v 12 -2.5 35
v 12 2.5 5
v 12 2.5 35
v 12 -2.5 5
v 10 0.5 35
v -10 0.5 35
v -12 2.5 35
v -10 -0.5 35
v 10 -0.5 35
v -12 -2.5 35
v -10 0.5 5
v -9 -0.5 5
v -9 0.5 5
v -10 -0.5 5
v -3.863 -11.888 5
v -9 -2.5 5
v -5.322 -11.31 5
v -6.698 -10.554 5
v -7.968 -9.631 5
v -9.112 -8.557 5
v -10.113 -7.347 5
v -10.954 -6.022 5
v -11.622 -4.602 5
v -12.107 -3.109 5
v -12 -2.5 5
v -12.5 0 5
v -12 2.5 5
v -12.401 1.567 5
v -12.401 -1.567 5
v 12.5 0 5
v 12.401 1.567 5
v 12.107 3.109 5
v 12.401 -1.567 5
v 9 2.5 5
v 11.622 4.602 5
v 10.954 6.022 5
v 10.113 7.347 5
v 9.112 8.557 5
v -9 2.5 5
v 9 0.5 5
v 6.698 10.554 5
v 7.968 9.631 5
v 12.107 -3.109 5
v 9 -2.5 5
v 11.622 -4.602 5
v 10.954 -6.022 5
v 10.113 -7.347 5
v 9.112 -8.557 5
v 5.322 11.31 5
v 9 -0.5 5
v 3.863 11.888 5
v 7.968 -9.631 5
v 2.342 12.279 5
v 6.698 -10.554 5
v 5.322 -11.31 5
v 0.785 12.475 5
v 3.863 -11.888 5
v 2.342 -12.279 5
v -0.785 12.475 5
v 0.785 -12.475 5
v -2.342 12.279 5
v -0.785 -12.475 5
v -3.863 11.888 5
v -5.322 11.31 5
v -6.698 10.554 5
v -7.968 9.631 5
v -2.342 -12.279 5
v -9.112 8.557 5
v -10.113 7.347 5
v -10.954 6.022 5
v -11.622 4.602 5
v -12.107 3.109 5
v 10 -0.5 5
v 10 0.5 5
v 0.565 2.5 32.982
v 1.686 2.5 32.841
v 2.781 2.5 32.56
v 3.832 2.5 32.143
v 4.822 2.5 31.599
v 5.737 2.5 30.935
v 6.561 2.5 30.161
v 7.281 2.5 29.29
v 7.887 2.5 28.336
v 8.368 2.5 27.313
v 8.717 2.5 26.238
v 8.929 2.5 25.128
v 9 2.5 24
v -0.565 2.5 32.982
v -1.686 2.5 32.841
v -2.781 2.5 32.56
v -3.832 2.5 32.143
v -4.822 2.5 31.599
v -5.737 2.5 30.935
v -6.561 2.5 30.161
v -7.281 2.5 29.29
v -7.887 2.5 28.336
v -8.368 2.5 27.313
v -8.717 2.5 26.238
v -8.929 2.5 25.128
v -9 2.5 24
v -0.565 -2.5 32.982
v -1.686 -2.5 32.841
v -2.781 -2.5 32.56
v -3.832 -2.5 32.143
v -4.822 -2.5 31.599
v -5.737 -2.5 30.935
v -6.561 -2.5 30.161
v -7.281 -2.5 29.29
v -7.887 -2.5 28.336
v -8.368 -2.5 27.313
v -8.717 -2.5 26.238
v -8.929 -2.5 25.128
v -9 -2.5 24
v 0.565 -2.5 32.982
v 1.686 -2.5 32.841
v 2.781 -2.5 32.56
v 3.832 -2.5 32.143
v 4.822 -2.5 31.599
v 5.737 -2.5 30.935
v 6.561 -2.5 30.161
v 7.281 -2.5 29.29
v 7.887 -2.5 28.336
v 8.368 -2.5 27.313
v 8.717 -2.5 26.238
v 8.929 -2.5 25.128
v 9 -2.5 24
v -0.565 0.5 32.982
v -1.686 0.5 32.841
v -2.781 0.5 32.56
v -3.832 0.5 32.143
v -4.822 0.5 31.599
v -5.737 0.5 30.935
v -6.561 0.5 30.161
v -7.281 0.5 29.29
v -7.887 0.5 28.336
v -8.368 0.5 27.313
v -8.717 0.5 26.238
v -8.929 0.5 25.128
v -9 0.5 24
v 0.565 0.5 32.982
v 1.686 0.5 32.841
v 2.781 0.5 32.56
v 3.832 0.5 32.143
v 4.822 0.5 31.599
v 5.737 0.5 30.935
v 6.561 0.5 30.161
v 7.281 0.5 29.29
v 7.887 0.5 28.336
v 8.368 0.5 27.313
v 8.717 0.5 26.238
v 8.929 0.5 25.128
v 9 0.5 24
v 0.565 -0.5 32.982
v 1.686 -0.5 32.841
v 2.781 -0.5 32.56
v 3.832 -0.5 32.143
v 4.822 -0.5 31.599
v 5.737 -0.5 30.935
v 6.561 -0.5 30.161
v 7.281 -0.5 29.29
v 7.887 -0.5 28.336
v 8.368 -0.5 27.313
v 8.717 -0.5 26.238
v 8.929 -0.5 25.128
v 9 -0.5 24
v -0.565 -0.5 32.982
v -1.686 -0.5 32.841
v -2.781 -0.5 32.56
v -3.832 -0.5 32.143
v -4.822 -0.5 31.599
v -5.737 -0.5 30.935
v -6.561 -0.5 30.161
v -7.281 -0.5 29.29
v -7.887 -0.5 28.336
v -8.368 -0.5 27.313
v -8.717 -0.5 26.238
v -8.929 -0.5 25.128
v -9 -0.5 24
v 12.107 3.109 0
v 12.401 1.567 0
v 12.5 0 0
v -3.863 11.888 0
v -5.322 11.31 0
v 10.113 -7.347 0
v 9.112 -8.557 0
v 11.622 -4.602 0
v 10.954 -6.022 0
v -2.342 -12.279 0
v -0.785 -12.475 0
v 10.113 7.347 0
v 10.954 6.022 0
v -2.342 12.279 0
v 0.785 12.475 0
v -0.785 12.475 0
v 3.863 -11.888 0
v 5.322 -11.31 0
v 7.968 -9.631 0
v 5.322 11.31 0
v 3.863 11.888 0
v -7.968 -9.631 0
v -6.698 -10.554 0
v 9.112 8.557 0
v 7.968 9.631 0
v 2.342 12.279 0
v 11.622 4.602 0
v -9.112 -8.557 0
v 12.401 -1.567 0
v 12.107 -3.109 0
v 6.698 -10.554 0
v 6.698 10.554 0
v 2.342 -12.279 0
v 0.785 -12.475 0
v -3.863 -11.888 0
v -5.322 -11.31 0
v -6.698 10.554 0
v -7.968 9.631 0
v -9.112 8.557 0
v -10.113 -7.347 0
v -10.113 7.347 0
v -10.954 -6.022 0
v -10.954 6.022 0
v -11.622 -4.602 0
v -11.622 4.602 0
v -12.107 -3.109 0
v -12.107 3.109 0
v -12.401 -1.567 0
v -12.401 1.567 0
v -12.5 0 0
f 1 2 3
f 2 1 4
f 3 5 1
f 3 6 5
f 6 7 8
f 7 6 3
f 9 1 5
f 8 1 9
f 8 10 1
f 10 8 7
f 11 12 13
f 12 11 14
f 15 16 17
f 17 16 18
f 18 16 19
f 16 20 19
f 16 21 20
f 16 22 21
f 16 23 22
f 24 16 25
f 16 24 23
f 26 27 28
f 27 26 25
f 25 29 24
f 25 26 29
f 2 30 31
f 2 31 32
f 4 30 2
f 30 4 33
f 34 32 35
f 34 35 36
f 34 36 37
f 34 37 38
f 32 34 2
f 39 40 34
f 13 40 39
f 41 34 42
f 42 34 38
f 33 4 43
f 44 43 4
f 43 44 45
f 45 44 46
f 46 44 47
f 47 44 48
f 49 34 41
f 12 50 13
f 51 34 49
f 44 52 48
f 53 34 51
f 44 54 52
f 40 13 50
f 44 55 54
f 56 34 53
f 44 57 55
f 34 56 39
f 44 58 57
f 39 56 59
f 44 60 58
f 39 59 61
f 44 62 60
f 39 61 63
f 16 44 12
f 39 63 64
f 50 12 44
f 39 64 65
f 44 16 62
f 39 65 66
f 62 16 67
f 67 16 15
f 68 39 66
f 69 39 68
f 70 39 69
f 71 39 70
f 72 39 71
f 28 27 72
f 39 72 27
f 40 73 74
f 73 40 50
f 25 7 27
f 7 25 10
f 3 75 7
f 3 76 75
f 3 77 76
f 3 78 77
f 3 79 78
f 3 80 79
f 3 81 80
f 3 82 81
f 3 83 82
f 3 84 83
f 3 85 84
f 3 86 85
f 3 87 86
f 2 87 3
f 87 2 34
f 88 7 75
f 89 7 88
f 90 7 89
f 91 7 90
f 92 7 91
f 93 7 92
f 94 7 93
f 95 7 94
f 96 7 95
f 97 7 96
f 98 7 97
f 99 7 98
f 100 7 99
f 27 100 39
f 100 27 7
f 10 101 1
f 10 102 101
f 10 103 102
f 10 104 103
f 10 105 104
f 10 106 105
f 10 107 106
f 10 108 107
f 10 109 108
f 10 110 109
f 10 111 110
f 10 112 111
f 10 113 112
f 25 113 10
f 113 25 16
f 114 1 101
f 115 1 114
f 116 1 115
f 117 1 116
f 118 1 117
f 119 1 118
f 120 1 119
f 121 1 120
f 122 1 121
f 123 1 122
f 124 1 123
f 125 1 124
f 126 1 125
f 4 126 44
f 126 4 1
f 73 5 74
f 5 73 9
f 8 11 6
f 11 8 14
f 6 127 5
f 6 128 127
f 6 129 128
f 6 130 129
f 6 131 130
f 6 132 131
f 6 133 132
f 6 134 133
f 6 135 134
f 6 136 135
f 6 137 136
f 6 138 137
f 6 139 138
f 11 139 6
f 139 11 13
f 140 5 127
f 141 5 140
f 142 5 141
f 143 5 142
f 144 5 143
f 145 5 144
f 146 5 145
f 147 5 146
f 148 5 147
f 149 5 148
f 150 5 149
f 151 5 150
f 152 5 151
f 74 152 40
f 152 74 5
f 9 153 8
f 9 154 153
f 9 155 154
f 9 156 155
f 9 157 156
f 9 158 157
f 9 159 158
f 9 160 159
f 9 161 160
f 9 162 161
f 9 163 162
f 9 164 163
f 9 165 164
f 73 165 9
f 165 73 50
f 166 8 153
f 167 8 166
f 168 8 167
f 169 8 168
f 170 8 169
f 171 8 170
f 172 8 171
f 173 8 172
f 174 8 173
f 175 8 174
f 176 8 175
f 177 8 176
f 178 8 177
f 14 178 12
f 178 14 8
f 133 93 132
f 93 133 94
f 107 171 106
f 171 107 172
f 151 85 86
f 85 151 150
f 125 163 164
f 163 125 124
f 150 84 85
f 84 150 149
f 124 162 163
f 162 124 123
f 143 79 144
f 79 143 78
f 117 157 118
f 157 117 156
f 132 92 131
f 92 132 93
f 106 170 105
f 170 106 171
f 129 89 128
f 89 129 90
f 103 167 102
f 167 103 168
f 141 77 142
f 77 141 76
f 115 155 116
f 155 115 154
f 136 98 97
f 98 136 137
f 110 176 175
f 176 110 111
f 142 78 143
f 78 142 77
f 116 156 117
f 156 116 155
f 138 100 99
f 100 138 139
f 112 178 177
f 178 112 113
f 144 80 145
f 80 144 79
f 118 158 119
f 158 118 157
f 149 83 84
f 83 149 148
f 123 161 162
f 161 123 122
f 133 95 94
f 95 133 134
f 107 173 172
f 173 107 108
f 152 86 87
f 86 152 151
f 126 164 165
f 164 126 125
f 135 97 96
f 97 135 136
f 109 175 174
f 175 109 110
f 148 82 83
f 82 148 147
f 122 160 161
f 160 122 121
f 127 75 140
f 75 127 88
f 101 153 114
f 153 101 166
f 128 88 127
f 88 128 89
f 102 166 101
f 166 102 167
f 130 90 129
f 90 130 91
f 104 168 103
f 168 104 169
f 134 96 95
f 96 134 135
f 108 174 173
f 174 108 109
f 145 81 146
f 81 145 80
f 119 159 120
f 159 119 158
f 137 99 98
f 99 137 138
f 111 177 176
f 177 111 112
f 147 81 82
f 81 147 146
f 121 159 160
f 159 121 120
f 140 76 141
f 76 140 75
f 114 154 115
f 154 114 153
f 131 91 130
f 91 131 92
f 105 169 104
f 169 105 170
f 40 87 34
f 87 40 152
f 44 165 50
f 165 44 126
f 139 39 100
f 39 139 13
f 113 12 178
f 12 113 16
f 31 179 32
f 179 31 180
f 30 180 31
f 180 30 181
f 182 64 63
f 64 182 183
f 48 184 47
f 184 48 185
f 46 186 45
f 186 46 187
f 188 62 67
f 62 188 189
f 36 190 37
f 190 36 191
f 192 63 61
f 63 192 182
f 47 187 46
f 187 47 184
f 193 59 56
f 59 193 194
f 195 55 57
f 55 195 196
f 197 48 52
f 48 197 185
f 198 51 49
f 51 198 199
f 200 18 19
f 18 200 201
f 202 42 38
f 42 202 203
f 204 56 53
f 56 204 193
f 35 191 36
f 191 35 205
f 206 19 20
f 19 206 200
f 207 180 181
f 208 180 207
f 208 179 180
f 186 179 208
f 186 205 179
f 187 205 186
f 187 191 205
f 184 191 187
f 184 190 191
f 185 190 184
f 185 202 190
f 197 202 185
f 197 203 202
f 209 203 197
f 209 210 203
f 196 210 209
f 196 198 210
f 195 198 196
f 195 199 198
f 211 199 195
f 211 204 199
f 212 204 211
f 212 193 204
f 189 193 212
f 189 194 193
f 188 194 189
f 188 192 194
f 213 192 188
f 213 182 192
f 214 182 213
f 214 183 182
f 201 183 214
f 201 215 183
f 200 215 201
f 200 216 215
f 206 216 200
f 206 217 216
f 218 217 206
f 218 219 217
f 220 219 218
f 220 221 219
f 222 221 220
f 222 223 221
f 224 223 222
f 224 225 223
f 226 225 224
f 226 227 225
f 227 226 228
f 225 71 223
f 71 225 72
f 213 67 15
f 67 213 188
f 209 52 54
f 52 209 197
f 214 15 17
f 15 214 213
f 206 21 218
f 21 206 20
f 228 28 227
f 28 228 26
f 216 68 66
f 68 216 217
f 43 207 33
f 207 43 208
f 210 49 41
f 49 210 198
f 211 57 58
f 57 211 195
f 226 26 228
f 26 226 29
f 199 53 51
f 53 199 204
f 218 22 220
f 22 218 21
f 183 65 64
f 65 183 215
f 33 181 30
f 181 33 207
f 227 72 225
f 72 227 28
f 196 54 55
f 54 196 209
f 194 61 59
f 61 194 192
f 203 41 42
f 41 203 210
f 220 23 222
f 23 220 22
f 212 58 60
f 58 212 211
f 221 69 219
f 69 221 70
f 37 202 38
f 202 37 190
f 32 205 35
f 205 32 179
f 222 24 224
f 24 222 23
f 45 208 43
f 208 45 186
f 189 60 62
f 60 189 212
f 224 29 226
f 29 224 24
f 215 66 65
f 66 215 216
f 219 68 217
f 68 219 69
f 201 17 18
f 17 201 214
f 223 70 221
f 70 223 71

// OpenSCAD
unitSize = 25;
groundHeight=5;
miniX=20;
miniY=1;
miniZ=30;
wall=2;
$fn = 50;
translate([-miniX/2 - wall,-wall -miniY/2,groundHeight]) 
{
difference()
{
    cube([miniX + wall * 2,miniY + 2 * wall,miniZ]);
    translate([wall,wall,0 ])
    cube([miniX,miniY,miniZ + 0.01]);
    
    translate([0,-0.01,miniZ - (miniX-wall)/2 -wall])
    rotate([-90,0,0])
    translate([(miniX+wall *2)/2,0,0])
    cylinder(miniY + 2 * wall + 0.02,d=miniX-wall,d=miniX-wall);
    
    translate([wall * 1.5,-0.01,0])
    cube([miniX-wall,miniY + 2 * wall + 0.02,miniZ - (miniX-wall)/2 -wall]);
}
}
cylinder(groundHeight,d=unitSize,d=unitSize);
